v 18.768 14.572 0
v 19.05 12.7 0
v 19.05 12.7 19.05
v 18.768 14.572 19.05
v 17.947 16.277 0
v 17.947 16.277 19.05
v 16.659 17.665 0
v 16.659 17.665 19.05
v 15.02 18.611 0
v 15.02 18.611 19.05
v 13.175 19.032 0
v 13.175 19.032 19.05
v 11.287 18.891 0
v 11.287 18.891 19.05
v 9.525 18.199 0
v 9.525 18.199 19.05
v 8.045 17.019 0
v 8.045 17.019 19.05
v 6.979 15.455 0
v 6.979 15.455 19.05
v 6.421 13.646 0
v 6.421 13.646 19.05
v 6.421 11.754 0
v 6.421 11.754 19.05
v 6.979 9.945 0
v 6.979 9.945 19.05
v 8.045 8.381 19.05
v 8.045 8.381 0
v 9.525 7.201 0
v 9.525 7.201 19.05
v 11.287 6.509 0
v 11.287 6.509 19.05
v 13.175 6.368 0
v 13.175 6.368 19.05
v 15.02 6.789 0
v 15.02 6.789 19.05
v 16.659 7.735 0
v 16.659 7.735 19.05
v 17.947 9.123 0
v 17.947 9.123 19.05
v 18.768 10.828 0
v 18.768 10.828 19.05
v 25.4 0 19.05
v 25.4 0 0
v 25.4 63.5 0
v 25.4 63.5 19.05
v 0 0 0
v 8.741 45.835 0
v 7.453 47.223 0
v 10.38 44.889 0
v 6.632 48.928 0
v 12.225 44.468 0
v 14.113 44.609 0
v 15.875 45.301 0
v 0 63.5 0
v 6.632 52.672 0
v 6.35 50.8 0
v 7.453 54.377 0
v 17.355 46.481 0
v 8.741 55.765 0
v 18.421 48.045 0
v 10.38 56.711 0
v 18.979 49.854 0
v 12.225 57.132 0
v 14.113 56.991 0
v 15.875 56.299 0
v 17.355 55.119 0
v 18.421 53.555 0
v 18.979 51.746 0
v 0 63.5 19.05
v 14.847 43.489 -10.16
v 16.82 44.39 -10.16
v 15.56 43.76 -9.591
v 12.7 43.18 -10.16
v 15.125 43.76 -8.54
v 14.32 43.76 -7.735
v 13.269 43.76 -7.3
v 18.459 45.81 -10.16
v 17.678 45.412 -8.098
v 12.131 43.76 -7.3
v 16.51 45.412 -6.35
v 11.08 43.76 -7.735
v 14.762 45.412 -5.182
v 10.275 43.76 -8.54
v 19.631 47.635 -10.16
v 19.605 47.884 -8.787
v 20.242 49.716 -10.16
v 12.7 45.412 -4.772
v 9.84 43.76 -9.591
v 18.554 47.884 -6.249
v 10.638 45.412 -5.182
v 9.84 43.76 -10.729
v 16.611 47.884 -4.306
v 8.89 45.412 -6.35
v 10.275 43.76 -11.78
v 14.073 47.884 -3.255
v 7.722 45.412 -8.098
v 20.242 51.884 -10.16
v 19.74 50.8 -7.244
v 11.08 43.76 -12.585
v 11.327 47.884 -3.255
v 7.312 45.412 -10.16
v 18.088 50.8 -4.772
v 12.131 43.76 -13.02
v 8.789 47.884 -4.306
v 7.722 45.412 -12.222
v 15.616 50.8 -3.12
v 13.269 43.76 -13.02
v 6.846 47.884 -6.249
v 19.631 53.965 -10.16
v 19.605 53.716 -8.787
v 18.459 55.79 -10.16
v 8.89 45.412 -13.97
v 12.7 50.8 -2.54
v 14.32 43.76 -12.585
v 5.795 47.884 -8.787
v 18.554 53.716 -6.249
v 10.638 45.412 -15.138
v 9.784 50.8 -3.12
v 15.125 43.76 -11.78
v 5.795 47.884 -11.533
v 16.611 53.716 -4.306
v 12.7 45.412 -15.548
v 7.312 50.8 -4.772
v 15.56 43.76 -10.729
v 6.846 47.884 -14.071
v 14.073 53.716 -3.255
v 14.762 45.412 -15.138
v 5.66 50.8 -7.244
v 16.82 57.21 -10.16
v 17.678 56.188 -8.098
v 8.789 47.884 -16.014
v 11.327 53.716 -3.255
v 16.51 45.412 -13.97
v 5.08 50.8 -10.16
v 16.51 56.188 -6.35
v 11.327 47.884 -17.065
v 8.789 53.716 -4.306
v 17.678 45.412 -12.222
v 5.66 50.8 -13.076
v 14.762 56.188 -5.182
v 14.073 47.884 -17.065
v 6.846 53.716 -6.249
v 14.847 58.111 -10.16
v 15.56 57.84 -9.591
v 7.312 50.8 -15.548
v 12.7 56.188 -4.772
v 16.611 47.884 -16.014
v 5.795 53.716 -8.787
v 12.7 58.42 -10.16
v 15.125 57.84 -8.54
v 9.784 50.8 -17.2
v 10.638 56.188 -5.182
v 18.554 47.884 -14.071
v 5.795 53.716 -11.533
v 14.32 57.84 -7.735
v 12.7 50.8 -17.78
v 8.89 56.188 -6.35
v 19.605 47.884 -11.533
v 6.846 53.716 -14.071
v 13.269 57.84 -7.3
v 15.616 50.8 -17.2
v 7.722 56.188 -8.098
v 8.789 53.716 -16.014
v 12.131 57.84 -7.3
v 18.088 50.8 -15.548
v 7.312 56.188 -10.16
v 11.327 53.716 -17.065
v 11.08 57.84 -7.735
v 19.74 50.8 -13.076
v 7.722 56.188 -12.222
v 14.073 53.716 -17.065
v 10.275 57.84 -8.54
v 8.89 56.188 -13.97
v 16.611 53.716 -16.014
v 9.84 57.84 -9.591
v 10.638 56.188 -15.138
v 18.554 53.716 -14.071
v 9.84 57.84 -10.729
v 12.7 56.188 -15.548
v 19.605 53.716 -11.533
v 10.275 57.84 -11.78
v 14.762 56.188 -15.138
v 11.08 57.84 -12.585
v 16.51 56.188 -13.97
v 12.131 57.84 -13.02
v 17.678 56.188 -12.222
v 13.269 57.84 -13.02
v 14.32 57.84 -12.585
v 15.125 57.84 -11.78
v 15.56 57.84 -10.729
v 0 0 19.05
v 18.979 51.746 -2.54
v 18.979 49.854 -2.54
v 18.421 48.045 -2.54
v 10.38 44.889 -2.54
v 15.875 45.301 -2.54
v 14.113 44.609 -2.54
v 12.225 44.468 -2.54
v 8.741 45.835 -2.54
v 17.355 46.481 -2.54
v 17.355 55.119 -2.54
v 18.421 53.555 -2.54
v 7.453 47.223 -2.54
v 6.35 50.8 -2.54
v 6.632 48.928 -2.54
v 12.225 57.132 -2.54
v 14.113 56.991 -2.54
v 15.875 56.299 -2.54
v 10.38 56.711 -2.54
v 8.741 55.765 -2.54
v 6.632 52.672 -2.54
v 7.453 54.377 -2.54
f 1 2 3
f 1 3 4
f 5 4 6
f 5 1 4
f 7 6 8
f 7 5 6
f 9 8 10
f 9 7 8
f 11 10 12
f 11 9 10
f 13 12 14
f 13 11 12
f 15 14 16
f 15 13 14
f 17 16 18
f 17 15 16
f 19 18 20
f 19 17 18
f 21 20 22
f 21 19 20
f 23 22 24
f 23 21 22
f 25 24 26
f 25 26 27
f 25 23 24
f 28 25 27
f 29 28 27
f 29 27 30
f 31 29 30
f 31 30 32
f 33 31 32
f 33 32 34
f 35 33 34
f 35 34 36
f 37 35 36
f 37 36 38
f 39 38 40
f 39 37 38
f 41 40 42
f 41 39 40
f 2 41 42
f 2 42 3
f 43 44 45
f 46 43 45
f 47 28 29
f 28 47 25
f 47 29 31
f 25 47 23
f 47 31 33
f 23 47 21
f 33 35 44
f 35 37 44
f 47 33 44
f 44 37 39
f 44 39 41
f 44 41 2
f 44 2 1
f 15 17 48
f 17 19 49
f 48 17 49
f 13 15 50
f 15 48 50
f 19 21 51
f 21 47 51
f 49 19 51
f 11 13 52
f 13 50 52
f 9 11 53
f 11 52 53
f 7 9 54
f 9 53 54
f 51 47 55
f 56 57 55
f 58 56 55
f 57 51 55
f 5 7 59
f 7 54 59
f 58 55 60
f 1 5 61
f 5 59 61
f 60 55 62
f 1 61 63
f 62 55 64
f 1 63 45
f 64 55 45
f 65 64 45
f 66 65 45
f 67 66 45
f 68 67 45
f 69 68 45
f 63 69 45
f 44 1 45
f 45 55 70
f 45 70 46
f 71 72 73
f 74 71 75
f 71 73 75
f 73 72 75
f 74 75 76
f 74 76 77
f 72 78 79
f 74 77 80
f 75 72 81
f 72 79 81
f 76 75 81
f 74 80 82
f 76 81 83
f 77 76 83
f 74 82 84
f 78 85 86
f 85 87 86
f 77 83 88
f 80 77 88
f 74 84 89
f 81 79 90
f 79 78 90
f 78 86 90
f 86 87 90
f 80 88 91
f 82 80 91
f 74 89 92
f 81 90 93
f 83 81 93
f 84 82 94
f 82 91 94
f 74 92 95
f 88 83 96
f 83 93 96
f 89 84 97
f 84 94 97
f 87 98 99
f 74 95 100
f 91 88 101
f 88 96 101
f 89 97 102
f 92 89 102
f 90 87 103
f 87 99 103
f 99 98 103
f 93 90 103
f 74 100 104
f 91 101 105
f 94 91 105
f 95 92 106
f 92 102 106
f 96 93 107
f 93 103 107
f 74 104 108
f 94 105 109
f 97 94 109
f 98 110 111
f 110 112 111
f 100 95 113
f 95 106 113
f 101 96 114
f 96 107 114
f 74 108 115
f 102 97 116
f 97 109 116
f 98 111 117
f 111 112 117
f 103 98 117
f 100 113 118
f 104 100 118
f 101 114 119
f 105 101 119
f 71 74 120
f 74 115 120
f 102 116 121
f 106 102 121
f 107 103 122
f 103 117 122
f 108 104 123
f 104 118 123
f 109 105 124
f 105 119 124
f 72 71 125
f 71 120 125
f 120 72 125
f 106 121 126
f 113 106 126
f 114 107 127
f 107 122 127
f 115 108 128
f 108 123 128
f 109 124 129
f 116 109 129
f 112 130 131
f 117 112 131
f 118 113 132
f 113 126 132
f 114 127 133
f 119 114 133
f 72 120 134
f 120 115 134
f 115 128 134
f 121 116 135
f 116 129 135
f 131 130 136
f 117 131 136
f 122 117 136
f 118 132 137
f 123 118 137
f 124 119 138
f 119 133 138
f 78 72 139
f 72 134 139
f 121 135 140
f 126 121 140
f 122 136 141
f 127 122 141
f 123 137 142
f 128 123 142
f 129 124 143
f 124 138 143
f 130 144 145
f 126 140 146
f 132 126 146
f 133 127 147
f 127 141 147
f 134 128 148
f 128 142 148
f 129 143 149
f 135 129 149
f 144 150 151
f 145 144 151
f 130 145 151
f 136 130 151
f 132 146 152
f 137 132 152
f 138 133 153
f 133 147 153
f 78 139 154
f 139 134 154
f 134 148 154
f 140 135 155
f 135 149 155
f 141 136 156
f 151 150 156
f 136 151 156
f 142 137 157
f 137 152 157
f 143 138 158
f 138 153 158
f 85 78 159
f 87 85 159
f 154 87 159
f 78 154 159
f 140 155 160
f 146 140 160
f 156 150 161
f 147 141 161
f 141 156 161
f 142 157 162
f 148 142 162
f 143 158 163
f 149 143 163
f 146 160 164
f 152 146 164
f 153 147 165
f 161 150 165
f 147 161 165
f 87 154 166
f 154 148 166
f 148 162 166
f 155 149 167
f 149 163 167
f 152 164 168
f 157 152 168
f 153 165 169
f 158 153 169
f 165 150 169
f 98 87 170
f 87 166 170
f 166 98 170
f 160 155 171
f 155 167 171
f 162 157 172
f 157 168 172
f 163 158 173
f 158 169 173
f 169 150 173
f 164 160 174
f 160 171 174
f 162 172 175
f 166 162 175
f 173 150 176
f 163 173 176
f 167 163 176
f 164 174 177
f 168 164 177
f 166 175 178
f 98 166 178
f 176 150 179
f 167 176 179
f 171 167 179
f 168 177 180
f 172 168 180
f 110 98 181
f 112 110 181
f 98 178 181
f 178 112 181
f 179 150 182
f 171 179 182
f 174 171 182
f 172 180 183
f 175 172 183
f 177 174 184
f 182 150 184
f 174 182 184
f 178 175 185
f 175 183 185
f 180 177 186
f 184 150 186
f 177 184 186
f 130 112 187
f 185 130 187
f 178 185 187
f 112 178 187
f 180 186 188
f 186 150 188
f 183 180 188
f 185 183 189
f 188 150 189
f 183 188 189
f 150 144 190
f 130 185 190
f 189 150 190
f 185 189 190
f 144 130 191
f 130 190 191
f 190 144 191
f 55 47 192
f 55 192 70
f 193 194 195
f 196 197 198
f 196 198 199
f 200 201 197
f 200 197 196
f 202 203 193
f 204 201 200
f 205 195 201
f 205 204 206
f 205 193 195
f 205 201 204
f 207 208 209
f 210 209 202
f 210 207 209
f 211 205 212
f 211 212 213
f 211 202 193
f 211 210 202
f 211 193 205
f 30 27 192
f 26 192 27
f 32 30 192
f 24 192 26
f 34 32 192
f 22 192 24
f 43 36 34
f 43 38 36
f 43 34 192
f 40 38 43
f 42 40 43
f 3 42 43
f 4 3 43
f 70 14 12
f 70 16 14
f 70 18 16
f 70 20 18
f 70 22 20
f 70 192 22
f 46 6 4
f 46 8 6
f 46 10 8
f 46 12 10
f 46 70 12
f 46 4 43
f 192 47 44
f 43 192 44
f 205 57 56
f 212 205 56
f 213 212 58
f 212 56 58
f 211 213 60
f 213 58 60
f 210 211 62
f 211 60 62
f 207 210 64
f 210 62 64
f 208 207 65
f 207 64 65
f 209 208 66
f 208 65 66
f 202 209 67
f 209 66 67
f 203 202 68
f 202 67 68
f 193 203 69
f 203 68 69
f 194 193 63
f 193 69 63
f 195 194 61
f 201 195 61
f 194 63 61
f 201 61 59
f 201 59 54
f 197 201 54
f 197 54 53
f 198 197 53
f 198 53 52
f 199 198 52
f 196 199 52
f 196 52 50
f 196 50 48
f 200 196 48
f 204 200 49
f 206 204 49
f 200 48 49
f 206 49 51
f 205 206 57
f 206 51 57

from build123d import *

# Parameters (mm, degrees)
SKETCH1_W           = 25.4
SKETCH1_H           = 63.5
SKETCH1_R           = 6.35
BOSS_EXTRUDE1_DEPTH = 19.05
SKETCH3_R           = 6.35
BOSS_EXTRUDE3_DEPTH = 2.54


with BuildPart() as part:
    # Sketch1 → Boss-Extrude1 (new body)
    with BuildSketch(Plane.XY):
        with Locations((12.7, 31.75)):
            Rectangle(SKETCH1_W, SKETCH1_H)
        with Locations((12.7, 12.7)):
            Circle(SKETCH1_R, mode=Mode.SUBTRACT)
    extrude(amount=BOSS_EXTRUDE1_DEPTH)

    # Sketch3 → Boss-Extrude3 (add)
    with BuildSketch(Plane(origin=(0, 0, 0), x_dir=(-1, 0, 0), z_dir=(0, 0, -1))):
        with Locations((-12.7, 50.8)):
            Circle(SKETCH3_R)
    extrude(amount=BOSS_EXTRUDE3_DEPTH)


with BuildPart() as body_2:
    # Sketch4 → Revolve1 (revolve)
    with BuildSketch(Plane(origin=(0, 0, -10.16), x_dir=(-1, 0, 0), z_dir=(0, 0, -1))):
        with BuildLine():
            Line((-12.7, 58.42), (-12.7, 43.18))
            ThreePointArc((-12.7, 43.18), (-20.32, 50.8), (-12.7, 58.42))
        make_face()
    revolve(axis=Axis((12.7, 58.42, -10.16), (0, -1, 0)))


solid = Compound([part.part, body_2.part])
